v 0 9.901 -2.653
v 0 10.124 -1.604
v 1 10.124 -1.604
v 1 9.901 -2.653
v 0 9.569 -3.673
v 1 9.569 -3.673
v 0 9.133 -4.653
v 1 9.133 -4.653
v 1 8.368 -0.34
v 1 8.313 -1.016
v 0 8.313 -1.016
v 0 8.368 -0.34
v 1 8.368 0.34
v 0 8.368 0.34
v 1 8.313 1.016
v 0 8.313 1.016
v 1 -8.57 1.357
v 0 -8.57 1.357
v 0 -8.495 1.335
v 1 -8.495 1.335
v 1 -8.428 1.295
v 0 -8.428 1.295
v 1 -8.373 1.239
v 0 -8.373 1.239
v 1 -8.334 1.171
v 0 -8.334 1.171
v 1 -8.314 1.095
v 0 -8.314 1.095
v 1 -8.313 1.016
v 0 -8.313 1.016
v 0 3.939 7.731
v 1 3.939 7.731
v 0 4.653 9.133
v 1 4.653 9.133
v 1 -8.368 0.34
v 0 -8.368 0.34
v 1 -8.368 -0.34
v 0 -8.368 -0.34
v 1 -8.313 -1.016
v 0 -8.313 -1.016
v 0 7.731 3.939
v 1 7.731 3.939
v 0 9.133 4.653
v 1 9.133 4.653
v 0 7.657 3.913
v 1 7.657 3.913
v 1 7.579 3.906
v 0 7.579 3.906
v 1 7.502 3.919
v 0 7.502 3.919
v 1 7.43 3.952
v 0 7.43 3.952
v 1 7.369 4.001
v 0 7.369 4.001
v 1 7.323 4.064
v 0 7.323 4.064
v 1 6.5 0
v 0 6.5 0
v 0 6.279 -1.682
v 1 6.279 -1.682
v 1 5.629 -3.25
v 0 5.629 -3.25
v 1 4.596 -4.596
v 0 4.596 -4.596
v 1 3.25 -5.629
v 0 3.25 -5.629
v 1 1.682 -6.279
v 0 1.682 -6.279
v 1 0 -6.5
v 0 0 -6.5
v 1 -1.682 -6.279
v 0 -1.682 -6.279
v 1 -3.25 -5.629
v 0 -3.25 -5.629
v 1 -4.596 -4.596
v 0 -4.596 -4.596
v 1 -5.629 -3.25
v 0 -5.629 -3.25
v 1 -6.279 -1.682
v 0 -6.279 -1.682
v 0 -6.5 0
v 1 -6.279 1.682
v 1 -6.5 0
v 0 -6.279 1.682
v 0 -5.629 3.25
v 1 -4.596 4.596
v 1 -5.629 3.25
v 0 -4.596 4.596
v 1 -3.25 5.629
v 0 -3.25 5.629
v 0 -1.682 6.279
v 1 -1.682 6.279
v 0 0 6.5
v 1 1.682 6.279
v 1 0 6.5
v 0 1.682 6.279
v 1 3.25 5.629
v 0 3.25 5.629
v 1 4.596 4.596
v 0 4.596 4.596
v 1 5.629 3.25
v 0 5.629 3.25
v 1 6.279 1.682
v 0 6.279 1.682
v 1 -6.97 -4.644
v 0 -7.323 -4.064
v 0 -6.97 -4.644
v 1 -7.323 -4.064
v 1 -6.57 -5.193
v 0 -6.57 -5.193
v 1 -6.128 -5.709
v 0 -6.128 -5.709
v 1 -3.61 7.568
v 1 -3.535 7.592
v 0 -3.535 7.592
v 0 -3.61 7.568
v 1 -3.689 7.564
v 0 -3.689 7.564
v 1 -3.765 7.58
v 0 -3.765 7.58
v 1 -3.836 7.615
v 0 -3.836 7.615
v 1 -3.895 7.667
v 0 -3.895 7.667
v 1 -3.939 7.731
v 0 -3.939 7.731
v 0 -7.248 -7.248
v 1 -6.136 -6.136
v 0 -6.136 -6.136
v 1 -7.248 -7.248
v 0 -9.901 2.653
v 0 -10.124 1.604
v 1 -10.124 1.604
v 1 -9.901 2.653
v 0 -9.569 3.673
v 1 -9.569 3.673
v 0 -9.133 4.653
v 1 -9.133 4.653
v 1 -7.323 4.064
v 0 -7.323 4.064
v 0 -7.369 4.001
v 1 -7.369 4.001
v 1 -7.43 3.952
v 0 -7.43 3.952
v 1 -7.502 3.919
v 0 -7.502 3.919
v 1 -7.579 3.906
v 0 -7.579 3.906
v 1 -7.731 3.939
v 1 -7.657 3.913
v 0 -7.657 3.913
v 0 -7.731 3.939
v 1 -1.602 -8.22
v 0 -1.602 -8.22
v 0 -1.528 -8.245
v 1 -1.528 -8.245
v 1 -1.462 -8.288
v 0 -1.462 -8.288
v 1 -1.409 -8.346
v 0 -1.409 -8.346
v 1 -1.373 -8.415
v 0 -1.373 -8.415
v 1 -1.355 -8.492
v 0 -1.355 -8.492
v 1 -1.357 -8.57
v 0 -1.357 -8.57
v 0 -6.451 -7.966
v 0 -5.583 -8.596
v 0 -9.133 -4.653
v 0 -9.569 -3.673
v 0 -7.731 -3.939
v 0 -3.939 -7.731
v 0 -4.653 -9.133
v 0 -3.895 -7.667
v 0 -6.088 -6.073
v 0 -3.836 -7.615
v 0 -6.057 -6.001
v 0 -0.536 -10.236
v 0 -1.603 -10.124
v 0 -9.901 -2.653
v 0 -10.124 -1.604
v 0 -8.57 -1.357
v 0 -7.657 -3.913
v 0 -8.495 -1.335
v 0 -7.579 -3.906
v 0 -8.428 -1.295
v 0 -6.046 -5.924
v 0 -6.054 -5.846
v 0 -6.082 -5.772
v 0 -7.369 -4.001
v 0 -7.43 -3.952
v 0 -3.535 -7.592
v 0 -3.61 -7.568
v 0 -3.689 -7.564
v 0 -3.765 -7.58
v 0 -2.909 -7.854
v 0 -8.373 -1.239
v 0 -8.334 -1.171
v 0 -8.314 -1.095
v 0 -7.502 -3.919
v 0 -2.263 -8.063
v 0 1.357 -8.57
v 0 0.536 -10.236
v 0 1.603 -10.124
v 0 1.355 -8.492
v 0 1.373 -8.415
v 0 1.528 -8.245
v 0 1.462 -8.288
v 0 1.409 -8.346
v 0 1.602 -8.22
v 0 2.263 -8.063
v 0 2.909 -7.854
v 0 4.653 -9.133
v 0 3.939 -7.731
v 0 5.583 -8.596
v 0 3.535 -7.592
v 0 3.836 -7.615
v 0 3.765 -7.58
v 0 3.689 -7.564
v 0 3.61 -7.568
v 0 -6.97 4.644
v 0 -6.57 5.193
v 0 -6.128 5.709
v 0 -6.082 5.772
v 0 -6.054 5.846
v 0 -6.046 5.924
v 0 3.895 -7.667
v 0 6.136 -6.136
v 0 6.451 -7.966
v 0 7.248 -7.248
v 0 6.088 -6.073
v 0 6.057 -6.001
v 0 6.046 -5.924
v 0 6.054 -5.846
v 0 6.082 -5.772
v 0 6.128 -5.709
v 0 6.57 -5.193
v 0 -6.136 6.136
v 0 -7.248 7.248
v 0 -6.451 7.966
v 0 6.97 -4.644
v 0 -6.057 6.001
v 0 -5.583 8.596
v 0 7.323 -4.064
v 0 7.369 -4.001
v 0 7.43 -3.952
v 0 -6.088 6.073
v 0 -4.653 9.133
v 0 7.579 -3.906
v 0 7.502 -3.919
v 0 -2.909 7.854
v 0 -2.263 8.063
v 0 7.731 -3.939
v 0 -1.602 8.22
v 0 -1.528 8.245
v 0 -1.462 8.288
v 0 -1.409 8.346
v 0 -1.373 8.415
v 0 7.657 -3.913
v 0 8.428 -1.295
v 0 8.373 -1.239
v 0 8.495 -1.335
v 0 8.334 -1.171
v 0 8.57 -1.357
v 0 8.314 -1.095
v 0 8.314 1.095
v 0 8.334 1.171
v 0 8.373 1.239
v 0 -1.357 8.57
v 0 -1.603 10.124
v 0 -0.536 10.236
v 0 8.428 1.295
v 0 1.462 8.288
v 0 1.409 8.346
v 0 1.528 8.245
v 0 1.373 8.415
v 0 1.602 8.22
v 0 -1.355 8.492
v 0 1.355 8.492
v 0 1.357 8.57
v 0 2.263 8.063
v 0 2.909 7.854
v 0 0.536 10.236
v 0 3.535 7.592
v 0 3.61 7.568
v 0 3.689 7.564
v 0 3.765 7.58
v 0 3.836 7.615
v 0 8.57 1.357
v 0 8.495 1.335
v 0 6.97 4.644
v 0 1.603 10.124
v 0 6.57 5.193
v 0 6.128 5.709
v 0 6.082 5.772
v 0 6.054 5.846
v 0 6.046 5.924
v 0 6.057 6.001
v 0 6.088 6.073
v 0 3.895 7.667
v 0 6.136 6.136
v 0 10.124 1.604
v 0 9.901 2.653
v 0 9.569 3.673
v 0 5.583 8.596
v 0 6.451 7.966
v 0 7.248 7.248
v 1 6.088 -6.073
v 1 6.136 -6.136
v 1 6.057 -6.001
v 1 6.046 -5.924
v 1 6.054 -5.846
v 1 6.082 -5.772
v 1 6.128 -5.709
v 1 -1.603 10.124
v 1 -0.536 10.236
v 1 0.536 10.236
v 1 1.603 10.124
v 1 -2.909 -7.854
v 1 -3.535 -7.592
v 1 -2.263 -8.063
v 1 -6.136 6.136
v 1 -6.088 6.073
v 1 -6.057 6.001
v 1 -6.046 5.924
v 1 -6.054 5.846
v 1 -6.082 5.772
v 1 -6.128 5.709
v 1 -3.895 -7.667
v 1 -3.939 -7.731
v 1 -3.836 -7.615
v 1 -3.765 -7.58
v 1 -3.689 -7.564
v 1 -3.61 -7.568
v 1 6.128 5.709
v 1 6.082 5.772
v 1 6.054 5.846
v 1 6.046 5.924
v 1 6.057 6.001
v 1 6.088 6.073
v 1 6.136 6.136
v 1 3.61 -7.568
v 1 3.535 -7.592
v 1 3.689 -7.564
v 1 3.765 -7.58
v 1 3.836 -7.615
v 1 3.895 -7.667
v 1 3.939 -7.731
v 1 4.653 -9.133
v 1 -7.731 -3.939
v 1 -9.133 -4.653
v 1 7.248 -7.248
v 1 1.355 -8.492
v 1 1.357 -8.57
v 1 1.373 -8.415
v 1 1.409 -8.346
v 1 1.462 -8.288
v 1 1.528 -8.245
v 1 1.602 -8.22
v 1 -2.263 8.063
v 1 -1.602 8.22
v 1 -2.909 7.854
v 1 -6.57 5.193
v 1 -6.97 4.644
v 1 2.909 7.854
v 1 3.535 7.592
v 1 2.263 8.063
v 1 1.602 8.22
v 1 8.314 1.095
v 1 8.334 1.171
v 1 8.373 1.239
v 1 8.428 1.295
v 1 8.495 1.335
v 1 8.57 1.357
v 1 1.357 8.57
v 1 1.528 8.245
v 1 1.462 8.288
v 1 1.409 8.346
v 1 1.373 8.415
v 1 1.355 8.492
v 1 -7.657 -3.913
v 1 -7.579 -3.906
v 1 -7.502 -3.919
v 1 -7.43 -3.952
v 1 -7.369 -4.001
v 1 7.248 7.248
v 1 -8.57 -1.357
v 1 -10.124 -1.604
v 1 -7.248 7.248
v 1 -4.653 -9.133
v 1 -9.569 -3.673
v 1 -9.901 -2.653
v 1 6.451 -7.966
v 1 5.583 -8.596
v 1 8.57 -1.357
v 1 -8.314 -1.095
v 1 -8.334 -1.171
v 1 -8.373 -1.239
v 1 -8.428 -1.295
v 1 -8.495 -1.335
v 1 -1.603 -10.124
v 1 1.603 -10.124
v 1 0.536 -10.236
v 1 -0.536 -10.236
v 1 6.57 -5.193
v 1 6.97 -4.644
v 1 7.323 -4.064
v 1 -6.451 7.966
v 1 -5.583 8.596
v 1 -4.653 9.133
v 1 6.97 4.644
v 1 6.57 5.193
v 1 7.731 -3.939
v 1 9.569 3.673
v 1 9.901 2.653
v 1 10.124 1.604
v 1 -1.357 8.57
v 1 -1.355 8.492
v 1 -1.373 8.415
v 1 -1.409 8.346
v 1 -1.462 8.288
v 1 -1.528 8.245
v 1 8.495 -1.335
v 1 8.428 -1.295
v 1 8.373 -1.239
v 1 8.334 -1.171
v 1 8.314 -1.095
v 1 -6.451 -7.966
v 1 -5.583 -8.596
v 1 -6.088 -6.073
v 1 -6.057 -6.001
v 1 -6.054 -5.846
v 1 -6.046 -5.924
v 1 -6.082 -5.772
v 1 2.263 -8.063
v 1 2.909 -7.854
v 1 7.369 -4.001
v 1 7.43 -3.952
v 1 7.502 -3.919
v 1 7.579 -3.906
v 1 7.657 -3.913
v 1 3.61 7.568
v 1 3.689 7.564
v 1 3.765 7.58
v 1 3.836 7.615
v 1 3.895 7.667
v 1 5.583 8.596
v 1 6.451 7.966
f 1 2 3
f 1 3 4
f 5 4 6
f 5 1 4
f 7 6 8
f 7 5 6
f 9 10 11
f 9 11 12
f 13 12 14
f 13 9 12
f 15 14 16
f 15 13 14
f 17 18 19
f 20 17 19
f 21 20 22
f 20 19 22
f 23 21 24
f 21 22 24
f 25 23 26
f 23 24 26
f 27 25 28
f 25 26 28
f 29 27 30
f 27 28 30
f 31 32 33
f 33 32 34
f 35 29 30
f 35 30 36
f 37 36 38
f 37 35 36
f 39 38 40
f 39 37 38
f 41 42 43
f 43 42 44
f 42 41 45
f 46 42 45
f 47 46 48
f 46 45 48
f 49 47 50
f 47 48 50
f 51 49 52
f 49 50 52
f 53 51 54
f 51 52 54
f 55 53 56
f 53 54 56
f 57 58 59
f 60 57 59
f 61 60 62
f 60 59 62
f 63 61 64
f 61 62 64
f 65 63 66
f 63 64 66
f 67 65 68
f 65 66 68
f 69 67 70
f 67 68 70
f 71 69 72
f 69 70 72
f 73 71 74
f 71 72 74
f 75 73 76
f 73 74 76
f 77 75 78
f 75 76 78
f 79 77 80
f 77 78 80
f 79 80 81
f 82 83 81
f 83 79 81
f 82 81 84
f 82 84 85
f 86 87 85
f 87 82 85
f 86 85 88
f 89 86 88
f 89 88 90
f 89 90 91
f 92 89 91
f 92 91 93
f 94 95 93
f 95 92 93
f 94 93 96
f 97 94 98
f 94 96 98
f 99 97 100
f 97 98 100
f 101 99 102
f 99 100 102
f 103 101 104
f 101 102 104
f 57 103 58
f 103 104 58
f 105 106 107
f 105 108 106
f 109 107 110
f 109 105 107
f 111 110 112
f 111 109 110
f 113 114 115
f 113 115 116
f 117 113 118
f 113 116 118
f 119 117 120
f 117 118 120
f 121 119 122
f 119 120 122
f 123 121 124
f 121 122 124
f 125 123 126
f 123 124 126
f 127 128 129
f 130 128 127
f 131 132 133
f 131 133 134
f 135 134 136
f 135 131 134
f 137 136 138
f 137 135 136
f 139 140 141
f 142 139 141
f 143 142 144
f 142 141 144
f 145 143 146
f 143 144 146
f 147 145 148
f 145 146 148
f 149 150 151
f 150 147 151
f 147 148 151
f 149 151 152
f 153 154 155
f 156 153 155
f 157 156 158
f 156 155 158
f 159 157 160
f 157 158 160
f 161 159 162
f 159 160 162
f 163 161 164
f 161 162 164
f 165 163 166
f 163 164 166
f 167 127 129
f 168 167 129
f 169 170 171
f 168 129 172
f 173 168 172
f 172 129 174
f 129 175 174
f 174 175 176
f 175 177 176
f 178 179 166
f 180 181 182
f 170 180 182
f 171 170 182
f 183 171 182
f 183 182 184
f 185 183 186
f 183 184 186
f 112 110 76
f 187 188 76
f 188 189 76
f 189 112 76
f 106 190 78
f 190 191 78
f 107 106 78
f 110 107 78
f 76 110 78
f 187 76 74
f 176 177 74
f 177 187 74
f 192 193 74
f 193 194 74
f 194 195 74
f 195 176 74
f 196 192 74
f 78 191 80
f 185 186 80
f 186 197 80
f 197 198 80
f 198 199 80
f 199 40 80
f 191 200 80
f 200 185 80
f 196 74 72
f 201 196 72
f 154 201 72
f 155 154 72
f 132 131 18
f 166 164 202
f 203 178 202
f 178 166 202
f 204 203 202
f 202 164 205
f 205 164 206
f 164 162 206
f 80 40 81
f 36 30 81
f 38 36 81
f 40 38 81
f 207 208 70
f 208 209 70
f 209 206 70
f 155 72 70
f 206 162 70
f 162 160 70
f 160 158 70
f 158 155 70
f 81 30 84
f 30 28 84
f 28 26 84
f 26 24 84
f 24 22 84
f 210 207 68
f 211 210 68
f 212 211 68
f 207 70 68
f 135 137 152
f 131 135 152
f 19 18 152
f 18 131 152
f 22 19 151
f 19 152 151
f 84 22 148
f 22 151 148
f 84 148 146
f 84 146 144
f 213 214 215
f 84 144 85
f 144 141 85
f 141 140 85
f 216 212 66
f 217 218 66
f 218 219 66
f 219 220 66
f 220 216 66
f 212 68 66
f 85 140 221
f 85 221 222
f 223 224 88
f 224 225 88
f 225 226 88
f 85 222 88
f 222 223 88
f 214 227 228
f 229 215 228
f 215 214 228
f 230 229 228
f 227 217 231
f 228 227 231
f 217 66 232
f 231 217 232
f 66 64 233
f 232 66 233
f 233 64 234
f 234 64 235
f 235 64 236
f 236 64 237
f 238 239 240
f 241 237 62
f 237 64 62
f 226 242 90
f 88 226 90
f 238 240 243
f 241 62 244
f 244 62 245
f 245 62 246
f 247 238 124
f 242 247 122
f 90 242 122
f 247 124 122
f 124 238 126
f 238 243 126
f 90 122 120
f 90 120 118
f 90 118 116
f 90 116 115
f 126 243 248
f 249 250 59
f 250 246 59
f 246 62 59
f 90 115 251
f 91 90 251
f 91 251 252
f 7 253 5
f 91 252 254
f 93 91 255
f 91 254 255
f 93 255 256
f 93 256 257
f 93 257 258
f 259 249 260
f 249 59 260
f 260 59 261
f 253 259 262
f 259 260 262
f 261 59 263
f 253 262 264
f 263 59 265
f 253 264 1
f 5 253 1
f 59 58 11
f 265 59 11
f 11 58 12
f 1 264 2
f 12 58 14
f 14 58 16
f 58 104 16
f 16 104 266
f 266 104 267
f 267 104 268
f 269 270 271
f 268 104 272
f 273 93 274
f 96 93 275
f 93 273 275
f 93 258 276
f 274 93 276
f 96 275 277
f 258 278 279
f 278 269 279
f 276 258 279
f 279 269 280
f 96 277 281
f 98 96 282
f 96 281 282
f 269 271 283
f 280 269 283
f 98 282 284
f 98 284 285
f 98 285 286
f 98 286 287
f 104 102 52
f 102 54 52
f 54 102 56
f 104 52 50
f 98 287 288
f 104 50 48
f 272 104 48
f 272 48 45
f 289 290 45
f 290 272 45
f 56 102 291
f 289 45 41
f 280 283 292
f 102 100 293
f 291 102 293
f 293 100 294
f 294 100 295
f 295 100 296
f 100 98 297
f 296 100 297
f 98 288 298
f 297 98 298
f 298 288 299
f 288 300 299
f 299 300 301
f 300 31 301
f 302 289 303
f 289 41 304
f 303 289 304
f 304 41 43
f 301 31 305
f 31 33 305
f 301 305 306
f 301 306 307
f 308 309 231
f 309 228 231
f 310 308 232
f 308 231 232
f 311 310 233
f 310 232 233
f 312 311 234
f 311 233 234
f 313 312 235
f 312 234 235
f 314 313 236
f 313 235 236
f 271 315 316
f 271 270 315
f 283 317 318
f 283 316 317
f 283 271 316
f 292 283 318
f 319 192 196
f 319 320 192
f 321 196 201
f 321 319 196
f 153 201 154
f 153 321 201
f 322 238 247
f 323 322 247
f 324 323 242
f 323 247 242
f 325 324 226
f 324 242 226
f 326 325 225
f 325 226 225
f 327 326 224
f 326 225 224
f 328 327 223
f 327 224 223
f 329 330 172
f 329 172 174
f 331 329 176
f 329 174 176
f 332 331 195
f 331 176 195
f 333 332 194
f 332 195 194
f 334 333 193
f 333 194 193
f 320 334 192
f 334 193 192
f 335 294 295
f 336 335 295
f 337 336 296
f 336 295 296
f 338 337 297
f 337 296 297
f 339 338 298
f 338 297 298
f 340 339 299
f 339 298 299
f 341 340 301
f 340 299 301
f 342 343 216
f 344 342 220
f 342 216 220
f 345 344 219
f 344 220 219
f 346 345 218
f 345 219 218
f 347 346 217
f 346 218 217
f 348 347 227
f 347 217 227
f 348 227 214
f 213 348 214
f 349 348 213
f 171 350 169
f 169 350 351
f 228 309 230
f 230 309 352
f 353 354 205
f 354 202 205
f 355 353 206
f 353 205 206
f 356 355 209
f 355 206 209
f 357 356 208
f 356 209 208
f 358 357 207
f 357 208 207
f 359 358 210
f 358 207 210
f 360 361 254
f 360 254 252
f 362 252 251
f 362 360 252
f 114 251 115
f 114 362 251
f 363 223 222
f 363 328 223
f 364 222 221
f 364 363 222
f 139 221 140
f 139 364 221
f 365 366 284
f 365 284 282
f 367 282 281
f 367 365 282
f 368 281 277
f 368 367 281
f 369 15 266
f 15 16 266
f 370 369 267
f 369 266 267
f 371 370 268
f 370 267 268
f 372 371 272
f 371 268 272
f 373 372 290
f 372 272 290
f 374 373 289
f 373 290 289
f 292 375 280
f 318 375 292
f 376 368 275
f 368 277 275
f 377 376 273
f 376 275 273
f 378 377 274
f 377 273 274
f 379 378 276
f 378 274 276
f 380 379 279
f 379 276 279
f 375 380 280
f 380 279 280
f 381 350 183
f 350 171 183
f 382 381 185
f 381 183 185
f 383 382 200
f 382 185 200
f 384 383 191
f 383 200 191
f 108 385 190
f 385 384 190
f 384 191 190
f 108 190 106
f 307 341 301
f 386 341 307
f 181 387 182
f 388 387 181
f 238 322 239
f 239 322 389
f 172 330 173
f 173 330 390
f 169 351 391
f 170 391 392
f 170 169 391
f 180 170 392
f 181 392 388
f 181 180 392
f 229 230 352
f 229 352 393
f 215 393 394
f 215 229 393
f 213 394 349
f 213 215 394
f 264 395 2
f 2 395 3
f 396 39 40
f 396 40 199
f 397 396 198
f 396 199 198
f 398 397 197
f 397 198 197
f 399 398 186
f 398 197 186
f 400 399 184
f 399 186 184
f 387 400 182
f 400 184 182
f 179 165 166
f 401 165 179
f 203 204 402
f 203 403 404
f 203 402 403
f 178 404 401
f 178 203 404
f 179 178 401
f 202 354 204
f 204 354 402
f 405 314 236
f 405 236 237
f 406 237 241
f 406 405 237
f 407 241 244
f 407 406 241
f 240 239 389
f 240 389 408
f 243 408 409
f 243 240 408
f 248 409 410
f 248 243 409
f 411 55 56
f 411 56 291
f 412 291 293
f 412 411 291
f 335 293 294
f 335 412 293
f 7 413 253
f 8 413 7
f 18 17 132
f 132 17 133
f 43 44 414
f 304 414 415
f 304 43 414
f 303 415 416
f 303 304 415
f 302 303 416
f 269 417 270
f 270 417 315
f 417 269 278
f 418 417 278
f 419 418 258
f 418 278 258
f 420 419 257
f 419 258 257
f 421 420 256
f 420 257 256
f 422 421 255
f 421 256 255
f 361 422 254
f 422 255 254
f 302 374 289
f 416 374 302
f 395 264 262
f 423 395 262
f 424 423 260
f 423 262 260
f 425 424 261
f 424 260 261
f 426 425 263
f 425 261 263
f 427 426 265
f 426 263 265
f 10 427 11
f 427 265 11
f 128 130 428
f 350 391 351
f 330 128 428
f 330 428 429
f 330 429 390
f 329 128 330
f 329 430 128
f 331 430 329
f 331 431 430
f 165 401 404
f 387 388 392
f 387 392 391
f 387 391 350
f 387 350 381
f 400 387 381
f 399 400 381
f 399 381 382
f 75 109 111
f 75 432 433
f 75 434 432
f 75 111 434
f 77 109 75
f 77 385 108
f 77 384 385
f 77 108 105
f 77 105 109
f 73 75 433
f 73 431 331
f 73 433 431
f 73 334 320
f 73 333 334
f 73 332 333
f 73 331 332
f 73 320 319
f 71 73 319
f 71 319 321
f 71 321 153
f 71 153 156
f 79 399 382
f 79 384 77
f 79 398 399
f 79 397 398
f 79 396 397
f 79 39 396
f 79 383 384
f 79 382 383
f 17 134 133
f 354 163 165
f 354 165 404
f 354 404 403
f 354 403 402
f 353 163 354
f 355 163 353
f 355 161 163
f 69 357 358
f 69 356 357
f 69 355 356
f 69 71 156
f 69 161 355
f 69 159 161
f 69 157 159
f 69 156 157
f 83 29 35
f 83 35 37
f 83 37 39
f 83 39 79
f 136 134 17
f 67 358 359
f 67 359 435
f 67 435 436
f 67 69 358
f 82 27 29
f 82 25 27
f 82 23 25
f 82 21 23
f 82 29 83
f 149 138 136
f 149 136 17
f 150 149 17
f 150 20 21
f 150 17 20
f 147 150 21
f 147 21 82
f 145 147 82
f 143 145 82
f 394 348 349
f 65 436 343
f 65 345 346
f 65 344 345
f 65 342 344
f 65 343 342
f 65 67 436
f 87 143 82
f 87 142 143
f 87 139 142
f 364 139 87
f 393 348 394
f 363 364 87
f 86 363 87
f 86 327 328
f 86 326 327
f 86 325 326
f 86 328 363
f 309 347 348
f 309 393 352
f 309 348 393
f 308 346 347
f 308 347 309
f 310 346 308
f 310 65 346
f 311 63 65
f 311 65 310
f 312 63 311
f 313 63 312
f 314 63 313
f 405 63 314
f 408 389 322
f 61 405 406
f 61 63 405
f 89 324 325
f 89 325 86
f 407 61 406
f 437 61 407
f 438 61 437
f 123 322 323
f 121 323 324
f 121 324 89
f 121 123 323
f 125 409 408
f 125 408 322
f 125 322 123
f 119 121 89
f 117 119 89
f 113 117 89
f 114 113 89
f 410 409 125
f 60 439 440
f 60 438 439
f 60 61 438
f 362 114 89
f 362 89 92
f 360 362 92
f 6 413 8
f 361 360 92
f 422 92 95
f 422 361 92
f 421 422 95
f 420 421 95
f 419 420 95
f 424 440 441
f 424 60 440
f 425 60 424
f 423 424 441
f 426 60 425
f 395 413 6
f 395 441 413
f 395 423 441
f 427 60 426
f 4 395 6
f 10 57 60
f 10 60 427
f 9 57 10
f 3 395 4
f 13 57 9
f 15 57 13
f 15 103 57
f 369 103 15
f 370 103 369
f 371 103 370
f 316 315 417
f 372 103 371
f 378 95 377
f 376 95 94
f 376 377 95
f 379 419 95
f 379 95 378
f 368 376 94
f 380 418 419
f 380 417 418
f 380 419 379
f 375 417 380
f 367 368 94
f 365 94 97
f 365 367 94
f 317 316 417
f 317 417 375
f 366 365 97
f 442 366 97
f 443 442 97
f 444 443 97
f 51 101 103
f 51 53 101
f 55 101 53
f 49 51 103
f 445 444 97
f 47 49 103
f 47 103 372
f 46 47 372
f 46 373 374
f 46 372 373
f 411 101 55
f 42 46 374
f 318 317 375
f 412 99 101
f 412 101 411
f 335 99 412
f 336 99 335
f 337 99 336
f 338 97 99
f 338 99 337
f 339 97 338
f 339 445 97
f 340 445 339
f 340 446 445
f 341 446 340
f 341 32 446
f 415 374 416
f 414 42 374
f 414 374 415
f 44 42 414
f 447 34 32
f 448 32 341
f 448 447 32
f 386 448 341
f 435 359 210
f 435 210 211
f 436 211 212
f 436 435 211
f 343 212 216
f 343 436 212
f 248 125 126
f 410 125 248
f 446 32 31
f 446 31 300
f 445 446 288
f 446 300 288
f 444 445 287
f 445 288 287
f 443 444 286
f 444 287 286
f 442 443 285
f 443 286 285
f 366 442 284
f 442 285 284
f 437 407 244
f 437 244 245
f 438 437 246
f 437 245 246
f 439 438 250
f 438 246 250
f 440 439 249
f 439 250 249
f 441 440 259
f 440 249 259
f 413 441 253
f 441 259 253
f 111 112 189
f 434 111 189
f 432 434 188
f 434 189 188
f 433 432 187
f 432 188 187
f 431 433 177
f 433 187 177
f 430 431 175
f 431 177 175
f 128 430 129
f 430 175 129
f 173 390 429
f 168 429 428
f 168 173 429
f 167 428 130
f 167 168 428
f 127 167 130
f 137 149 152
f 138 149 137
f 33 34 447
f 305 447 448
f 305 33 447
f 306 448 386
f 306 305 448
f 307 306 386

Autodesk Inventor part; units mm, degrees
ref_plane "YZ Plane" through (0, 0, 0) normal (1, 0, 0) x (0, 1, 0)
ref_plane "XZ Plane" through (0, 0, 0) normal (0, 1, 0) x (-1, 0, 0)
sketch "Эскиз1" plane through (0, 0, 0) normal (1, 0, 0) x (0, 1, 0)
  circle A0 centre (0, 0) radius 10.25
  circle A1 centre (0, 0) radius 6.5
  dimension "d0" = 20.5
  dimension "d1" = 13
extrude "Базовый элемент" add sketch "Эскиз1" along normal blind 1
sketch "Эскиз2" plane through (1, 0, 0) normal (1, 0, 0) x (0, 0, -1)
  circle A0 centre (0, 0) radius 10.25 projected
  line L0 (0, 0) -> (0, 10.25) construction
  arc A1 (1.6035, 10.1238) -> (-1.6035, 10.1238) centre (0, 0) ccw
  arc A2 (1.3101, 8.2719) -> (-1.3101, 8.2719) centre (0, 0) ccw
  line L1 (-1.3101, 8.2719) -> (-1.6035, 10.1238)
  line L2 (1.3101, 8.2719) -> (1.6035, 10.1238)
  line L3 (-1.3101, 8.2719) -> (0, 0) construction
  line L4 (0, 0) -> (1.3101, 8.2719) construction
  dimension "d4" = 18
  dimension "d5" = 16.75
extrude "Вырез" cut sketch "Эскиз2" against normal through all contours L2 A2 L1 A0 picked at (0.1461, 9.6118)
fillet "Сопряжение1" radius 0.3075 2 edges at (0.5, 8.2719, 1.3101) (0.5, 8.2719, -1.3101)
pattern_circular "Вырезы" count 10 over 360 about axis through (0, 0, 0) along (1, 0, 0) of "Вырез", "Сопряжение1"
ref_plane "Work Plane1" through (0, 0, 0) normal (0, -1, 0) x (1, 0, 0)
equation "\"d0\" = SD2"
equation "\"d1\" = SD1"
equation "\"d2\" = SD"
equation "\"d5\" = 0.5 * SD2 + 0.5 * SD1"
equation "\"d6\" = SD"
equation "\"d8\" = 0.015 * SD2"
equation "\"SD\" = 1"
equation "\"SD1\" = 13"
equation "\"SD2\" = 20.5"
equation "\"NND\" = 12"
properties part number "DIN 6797 - A 13" material "Сталь, мягкая"
